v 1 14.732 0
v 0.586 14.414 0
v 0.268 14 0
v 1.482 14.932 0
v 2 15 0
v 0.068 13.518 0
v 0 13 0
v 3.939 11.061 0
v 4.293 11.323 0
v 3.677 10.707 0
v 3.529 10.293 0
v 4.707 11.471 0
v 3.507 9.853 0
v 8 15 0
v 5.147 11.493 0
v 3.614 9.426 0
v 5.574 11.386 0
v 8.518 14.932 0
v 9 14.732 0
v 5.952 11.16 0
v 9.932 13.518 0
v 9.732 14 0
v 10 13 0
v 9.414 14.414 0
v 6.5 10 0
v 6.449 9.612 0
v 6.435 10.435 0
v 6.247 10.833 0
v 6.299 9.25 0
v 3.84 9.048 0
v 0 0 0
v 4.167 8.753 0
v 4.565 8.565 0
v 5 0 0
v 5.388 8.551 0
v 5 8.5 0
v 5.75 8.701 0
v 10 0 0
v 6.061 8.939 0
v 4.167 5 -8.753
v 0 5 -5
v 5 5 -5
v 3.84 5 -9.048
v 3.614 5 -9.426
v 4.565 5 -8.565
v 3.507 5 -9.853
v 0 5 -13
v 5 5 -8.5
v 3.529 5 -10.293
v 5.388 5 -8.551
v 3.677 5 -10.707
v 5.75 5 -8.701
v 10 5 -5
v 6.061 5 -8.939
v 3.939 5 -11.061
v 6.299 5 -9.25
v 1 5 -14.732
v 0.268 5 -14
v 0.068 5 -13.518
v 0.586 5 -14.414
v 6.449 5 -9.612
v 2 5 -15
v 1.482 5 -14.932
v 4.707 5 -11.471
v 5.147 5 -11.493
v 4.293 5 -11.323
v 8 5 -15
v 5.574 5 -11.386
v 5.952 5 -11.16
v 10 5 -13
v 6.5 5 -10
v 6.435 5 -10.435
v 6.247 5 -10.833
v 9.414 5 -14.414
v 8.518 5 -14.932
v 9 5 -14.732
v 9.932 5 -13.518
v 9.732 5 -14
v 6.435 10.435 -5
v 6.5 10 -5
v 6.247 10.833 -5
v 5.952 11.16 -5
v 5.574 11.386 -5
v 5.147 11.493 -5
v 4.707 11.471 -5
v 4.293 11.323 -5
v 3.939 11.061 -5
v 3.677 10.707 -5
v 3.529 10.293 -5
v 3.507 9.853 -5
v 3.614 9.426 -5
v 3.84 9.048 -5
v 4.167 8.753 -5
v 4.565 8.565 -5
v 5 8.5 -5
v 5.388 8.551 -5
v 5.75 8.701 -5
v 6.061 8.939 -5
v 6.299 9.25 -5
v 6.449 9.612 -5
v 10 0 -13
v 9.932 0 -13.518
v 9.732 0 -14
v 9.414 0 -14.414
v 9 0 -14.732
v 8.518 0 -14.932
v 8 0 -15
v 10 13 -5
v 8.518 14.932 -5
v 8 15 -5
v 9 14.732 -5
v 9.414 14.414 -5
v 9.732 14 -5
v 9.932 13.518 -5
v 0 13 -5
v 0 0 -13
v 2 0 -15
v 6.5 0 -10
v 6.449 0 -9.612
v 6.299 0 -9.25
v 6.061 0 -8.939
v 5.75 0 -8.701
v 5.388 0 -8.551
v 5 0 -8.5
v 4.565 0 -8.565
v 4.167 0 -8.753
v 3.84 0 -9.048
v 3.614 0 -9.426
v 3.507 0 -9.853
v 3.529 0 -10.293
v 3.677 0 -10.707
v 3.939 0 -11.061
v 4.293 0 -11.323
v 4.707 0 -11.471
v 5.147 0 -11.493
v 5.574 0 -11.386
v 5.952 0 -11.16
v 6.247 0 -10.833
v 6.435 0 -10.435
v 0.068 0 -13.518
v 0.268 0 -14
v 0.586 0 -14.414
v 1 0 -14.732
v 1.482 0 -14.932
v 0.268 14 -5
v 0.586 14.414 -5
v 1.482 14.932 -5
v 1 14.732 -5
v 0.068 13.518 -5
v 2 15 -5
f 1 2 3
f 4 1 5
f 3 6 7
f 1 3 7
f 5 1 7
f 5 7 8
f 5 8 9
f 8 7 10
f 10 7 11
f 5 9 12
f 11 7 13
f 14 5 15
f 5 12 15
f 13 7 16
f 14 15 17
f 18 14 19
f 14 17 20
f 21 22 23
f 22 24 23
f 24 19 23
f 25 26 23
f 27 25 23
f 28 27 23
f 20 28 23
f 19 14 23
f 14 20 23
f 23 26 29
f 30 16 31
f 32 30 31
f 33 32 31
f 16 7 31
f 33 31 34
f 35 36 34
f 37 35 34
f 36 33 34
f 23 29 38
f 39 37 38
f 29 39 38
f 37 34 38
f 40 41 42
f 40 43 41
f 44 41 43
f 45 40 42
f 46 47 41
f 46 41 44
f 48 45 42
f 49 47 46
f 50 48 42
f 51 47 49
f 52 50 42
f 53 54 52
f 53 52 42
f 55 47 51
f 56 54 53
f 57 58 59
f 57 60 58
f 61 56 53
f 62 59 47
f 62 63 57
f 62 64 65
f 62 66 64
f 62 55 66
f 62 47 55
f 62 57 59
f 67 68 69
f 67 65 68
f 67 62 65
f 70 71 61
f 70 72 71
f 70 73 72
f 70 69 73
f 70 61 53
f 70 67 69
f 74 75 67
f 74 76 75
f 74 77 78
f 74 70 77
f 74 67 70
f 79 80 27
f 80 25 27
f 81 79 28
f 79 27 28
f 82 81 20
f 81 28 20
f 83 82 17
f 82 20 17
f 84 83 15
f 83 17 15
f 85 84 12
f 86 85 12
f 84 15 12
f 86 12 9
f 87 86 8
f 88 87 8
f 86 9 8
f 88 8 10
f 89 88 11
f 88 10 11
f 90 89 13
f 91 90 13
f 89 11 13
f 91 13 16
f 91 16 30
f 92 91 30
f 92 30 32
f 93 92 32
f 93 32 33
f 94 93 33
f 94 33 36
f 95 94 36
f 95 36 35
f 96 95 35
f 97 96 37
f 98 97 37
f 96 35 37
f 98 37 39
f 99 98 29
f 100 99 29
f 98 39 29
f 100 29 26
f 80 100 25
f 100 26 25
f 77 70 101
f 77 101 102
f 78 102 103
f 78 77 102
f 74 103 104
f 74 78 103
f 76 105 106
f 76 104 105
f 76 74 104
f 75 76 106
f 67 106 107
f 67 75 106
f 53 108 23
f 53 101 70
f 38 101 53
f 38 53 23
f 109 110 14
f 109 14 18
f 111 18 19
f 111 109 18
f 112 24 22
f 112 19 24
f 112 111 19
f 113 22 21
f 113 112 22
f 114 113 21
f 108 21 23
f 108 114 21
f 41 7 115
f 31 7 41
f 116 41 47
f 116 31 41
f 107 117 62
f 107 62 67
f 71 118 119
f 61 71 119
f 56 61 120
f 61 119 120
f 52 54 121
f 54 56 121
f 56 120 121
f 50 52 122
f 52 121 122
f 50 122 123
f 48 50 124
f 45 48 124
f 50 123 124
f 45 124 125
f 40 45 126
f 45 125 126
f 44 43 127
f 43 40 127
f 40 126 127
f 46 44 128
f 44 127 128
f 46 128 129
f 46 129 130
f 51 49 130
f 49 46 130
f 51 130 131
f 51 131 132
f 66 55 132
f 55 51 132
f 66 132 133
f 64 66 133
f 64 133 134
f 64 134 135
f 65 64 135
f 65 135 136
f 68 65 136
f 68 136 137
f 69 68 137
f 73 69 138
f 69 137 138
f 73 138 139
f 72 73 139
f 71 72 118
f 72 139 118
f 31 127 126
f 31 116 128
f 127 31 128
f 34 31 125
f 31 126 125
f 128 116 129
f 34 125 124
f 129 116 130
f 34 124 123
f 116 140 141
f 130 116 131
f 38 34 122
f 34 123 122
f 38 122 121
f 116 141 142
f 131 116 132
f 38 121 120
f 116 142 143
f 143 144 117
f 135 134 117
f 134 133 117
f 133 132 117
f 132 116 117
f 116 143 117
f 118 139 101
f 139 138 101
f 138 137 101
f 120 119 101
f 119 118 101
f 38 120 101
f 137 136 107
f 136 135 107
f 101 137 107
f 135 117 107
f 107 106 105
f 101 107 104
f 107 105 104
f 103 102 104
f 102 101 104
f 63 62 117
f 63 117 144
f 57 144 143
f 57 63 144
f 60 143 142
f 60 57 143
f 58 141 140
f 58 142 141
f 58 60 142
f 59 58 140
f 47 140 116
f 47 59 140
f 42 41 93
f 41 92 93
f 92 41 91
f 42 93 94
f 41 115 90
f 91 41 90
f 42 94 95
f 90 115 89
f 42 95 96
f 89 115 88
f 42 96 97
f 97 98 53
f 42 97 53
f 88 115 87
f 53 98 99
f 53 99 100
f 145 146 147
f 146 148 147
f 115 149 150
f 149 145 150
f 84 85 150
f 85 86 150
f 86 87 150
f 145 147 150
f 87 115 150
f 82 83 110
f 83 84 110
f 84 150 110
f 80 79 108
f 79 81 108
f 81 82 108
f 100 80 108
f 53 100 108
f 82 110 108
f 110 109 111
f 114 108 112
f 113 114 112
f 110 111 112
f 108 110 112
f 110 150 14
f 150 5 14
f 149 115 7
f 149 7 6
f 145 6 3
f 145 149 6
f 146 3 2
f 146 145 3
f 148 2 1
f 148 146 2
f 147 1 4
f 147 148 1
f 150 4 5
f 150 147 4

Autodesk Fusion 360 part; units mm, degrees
sketch "Sketch1" plane through (0, 0, 0) normal (0, 1, 0) x (1, 0, 0)
  line L0 (0, 0) -> (10, 0)
  line L1 (5, 0) -> (5, 10)
  line L2 (0, 0) -> (0, 15)
  line L3 (0, 15) -> (10, 15)
  line L4 (10, 15) -> (10, 0)
  circle A0 centre (5, 10) radius 1.5
  dimension "d1" = 3
extrude "Extrude1" add sketch "Sketch1" along normal blind 5
sketch "Sketch2" plane through (0, 0, 0) normal (0, 0, 1) x (1, 0, 0)
  line L0 (0, 0) -> (10, 0)
  line L1 (10, 0) -> (10, 5)
  line L2 (10, 5) -> (0, 5)
  line L3 (0, 5) -> (0, 0)
  line L4 (5, 0) -> (5, 10)
  line L5 (0, 5) -> (0, 15)
  line L6 (0, 15) -> (10, 15)
  line L7 (10, 15) -> (10, 5)
  circle A0 centre (5, 10) radius 1.5
  dimension "d4" = 10
  dimension "d5" = 3
extrude "Extrude2" add sketch "Sketch2" against normal blind 5 contours L2 L5 L6 L7
fillet "Fillet1" radius 2 4 edges at (10, 15, -2.5) (10, 2.5, -15) (0, 15, -2.5) (0, 2.5, -15)
